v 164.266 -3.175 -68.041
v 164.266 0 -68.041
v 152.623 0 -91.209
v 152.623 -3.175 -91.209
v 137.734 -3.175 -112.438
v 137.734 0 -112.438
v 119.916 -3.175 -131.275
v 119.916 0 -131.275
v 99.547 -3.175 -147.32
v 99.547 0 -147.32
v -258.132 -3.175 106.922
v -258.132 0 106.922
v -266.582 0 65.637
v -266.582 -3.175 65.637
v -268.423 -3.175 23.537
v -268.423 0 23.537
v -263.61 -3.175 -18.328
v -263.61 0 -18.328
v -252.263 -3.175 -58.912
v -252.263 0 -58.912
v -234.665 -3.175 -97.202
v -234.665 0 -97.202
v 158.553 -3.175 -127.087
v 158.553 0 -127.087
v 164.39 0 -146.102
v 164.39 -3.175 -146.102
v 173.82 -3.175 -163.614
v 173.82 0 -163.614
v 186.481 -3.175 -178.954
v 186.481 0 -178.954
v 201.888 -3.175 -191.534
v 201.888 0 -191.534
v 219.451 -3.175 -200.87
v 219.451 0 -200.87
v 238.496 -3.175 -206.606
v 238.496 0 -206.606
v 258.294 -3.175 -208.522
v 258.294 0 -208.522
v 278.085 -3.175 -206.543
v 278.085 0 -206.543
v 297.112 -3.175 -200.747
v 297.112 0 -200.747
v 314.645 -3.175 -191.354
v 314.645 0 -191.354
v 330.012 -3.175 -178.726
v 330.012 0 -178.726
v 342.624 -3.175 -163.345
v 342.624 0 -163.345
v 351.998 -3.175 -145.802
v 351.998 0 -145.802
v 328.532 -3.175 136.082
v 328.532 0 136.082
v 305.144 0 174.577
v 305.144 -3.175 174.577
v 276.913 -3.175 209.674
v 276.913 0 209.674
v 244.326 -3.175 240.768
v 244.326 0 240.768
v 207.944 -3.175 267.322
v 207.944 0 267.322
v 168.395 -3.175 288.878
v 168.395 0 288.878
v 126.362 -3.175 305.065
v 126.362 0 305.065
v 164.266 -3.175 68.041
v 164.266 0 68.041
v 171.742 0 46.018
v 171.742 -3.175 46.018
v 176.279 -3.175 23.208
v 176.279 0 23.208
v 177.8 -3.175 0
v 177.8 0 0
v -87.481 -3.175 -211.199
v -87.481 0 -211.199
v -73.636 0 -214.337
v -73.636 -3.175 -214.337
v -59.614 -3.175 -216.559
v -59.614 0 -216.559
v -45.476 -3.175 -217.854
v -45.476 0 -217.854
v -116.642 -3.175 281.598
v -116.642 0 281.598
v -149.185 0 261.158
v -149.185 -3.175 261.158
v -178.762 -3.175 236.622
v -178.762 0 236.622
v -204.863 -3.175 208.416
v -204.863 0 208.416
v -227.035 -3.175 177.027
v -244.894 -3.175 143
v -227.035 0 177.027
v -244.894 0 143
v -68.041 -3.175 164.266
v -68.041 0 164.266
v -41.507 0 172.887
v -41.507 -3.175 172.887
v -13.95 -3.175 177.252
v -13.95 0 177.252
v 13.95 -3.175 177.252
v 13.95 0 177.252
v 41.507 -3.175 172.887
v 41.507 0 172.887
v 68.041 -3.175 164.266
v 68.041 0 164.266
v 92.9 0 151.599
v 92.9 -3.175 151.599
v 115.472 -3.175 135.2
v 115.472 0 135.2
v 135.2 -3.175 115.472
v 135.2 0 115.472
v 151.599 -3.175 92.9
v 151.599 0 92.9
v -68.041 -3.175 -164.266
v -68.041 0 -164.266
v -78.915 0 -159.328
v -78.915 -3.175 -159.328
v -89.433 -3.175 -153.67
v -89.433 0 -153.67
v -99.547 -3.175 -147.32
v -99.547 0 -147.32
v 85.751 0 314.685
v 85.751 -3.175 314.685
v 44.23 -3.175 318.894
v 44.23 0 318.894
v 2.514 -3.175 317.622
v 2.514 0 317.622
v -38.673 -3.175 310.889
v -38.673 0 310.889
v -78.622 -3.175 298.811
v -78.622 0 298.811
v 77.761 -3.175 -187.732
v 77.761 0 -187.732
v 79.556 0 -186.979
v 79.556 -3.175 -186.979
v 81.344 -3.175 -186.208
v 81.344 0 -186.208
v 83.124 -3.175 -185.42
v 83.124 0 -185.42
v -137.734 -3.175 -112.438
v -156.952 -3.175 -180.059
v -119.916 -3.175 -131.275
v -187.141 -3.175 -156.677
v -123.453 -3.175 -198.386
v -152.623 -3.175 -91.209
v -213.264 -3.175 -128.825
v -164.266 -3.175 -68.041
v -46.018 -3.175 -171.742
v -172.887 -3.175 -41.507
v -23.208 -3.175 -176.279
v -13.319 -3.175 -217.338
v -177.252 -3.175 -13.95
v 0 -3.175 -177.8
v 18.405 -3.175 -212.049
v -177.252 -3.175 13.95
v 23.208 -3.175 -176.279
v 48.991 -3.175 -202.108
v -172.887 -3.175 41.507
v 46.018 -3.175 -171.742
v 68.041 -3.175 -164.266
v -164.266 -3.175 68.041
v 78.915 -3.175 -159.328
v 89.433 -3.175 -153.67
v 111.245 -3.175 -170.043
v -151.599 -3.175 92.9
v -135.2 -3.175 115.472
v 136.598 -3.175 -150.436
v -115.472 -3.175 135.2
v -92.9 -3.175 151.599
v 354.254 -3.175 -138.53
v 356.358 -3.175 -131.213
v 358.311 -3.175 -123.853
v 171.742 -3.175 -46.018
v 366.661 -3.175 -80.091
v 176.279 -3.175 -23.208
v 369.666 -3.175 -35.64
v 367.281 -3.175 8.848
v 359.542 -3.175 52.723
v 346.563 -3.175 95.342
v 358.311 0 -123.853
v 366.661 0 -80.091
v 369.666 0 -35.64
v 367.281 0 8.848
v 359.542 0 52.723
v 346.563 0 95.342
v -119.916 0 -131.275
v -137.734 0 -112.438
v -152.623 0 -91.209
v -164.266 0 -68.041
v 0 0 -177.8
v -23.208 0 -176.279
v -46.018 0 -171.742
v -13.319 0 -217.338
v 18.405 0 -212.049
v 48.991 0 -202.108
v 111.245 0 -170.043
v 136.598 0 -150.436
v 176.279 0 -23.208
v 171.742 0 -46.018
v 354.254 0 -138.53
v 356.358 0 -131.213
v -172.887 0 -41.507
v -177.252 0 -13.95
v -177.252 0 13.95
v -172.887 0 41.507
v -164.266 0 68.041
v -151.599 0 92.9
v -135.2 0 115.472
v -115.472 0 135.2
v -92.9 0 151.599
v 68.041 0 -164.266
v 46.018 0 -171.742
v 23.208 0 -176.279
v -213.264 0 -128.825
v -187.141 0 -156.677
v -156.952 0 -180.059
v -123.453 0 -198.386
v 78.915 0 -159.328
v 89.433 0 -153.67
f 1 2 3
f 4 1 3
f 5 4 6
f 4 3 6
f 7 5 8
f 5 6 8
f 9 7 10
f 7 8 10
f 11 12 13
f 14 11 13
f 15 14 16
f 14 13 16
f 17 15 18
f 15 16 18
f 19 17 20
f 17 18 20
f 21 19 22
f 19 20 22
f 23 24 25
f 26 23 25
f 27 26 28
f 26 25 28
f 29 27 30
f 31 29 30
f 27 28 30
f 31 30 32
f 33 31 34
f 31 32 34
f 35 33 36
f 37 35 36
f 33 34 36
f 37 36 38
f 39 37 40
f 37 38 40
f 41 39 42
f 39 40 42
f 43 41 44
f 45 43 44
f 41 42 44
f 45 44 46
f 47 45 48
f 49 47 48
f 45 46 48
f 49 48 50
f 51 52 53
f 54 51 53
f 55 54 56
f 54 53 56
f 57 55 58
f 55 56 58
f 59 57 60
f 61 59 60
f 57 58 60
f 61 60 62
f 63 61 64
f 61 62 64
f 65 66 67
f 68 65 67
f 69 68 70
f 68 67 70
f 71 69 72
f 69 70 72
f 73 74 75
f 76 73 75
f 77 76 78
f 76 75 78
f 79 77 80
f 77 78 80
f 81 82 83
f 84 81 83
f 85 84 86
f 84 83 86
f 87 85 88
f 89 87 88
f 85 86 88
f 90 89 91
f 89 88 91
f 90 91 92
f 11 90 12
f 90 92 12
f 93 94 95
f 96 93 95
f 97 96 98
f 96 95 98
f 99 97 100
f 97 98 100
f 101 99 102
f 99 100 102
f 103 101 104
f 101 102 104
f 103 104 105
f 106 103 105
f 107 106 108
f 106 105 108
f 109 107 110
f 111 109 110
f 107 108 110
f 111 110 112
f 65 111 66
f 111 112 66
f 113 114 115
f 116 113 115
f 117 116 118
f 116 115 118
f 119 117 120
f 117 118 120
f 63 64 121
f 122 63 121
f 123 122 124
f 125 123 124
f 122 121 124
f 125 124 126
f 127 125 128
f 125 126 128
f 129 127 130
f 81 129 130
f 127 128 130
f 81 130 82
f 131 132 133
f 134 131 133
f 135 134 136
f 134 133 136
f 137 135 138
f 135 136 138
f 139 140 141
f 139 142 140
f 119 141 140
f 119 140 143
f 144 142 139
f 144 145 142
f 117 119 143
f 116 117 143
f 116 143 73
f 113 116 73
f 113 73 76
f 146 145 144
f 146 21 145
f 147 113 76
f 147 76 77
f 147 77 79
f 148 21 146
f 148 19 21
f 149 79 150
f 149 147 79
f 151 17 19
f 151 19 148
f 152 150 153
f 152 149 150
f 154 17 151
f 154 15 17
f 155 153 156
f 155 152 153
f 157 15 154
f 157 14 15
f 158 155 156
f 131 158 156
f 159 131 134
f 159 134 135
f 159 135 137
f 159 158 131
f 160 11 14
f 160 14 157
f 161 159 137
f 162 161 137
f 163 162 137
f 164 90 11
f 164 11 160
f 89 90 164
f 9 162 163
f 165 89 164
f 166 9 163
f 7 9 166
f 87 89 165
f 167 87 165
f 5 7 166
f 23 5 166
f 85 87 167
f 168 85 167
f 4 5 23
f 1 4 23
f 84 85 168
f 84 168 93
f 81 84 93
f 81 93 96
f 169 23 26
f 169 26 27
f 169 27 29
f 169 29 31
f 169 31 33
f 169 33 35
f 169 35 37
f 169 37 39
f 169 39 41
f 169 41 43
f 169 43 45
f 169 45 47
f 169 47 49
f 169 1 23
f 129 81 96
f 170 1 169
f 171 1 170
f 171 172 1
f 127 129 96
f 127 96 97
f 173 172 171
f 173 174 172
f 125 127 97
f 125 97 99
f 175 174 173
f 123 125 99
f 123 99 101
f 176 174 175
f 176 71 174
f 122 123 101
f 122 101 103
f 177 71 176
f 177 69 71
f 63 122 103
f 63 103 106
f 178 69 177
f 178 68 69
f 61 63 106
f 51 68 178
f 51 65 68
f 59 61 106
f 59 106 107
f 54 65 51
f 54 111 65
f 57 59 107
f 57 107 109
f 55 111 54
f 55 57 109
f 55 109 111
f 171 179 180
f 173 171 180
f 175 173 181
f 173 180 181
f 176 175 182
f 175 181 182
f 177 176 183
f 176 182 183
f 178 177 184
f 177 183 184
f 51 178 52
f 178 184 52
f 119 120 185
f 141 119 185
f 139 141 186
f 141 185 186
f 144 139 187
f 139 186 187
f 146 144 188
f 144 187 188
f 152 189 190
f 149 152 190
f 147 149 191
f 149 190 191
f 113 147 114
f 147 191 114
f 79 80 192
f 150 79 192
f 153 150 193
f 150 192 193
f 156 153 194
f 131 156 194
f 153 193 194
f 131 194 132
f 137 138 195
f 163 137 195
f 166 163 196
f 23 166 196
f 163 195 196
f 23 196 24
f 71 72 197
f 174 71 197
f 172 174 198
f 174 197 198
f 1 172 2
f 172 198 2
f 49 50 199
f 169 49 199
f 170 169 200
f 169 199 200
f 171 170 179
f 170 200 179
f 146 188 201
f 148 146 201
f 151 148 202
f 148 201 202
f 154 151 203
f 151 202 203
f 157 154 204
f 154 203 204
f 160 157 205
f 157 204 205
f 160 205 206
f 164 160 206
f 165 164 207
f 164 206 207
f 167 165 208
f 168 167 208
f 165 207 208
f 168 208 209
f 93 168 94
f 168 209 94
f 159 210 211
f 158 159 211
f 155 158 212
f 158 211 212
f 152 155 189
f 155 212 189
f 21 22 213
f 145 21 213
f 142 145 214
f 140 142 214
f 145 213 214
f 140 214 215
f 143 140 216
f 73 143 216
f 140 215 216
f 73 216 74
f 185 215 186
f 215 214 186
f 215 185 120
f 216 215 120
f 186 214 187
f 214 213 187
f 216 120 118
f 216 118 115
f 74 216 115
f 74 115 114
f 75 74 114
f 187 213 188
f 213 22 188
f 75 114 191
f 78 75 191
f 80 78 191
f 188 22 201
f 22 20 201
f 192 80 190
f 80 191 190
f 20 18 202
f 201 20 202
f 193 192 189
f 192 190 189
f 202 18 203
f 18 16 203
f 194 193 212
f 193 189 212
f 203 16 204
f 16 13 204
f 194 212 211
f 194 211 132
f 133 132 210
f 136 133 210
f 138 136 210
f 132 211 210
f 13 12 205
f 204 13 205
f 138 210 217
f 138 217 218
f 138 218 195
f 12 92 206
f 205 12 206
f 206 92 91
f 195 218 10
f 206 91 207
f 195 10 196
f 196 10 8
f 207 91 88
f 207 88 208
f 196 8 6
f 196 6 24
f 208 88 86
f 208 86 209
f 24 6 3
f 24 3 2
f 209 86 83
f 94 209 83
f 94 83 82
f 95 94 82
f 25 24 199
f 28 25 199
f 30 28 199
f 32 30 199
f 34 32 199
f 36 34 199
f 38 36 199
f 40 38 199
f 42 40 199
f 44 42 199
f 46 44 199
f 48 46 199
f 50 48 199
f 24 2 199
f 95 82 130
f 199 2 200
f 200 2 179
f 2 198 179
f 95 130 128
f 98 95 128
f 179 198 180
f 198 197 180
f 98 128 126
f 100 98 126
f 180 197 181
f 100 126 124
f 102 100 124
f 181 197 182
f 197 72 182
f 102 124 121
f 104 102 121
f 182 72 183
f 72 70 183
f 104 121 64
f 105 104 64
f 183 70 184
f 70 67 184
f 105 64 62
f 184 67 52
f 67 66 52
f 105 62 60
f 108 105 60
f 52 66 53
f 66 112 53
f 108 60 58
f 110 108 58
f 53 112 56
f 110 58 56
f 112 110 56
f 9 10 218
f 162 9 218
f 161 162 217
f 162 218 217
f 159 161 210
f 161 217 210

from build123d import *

# Parameters (mm, degrees)
F1_DEPTH = 3.175


with BuildPart() as f1:
    # F0 (on Front) → F1 (new body)
    with BuildSketch(Plane.XZ):
        with BuildLine():
            ThreePointArc((164.2657808805, 68.0411142745), (174.3836228557, 34.6870592545), (177.8, 0))
            ThreePointArc((177.8, 0), (174.3836228557, -34.6870592545), (164.2657808805, -68.0411142745))
            ThreePointArc((164.2657808805, -68.0411142745), (277.9531181005, -7.2739665138), (359.7319413837, -106.9217510028))
            ThreePointArc((359.7319413837, -106.9217510028), (359.3761364248, -115.4172186461), (358.3112136183, -123.8531837399))
            ThreePointArc((358.3112136183, -123.8531837399), (367.281161492, 8.8480312827), (328.531561761, 136.082228549))
            Line((328.531561761, 136.082228549), (164.2657808805, 68.0411142745))
        make_face()
        with BuildLine():
            ThreePointArc((68.0411142745, 164.2657808805), (125.723585695, 125.723585695), (164.2657808805, 68.0411142745))
            Line((164.2657808805, 68.0411142745), (328.531561761, 136.082228549))
            ThreePointArc((328.531561761, 136.082228549), (244.3258111618, 240.7675034736), (126.362069367, 305.0650216352))
            Line((126.362069367, 305.0650216352), (68.0411142745, 164.2657808805))
        make_face()
        with BuildLine():
            ThreePointArc((158.5532229762, -127.0870390081), (157.0041232469, -97.1378663495), (164.2657808805, -68.0411142745))
            ThreePointArc((164.2657808805, -68.0411142745), (137.7338592366, -112.4376450296), (99.5472631467, -147.32))
            ThreePointArc((99.5472631467, -147.32), (93.3013149914, -167.2172179653), (83.1243863135, -185.42))
            ThreePointArc((83.1243863135, -185.42), (124.3088906415, -160.740597571), (158.5532229762, -127.0870390081))
        make_face()
        with BuildLine():
            ThreePointArc((359.7319413837, -106.9217510028), (277.9531181005, -7.2739665138), (164.2657808805, -68.0411142745))
            Line((164.2657808805, -68.0411142745), (258.1319413837, -106.9217510028))
            Line((258.1319413837, -106.9217510028), (351.9981018868, -145.8023877311))
            ThreePointArc((351.9981018868, -145.8023877311), (355.3248382646, -134.8767336877), (358.3112136183, -123.8531837399))
            ThreePointArc((358.3112136183, -123.8531837399), (359.3761364248, -115.4172186461), (359.7319413837, -106.9217510028))
        make_face()
        with BuildLine():
            Line((258.1319413837, -106.9217510028), (164.2657808805, -68.0411142745))
            ThreePointArc((164.2657808805, -68.0411142745), (157.0041232469, -97.1378663495), (158.5532229762, -127.0870390081))
            ThreePointArc((158.5532229762, -127.0870390081), (248.3480567304, -208.0495691395), (351.9981018868, -145.8023877311))
            Line((351.9981018868, -145.8023877311), (258.1319413837, -106.9217510028))
        make_face()
        with BuildLine():
            ThreePointArc((-68.0411142745, 164.2657808805), (0, 177.8), (68.0411142745, 164.2657808805))
            Line((68.0411142745, 164.2657808805), (126.362069367, 305.0650216352))
            ThreePointArc((126.362069367, 305.0650216352), (2.514428483, 317.6217641107), (-116.6419101849, 281.5984815094))
            Line((-116.6419101849, 281.5984815094), (-68.0411142745, 164.2657808805))
        make_face()
        with BuildLine():
            ThreePointArc((83.1243863135, -185.42), (93.3013149914, -167.2172179653), (99.5472631467, -147.32))
            ThreePointArc((99.5472631467, -147.32), (84.2214695555, -156.5873049322), (68.0411142745, -164.2657808805))
            Line((68.0411142745, -164.2657808805), (77.7612734566, -187.7323210063))
            ThreePointArc((77.7612734566, -187.7323210063), (80.4511378852, -186.5954297752), (83.1243863135, -185.42))
        make_face()
        with BuildLine():
            ThreePointArc((-164.2657808805, 68.0411142745), (-125.723585695, 125.723585695), (-68.0411142745, 164.2657808805))
            Line((-68.0411142745, 164.2657808805), (-116.6419101849, 281.5984815094))
            ThreePointArc((-116.6419101849, 281.5984815094), (-204.8629851326, 208.4159123673), (-258.1319413837, 106.9217510028))
            Line((-258.1319413837, 106.9217510028), (-164.2657808805, 68.0411142745))
        make_face()
        with BuildLine():
            ThreePointArc((-164.2657808805, -68.0411142745), (-177.8, 0), (-164.2657808805, 68.0411142745))
            Line((-164.2657808805, 68.0411142745), (-258.1319413837, 106.9217510028))
            ThreePointArc((-258.1319413837, 106.9217510028), (-266.8448532831, 2.5095343628), (-234.6654012579, -97.2015918207))
            Line((-234.6654012579, -97.2015918207), (-164.2657808805, -68.0411142745))
        make_face()
        with BuildLine():
            ThreePointArc((-99.5472631467, -147.32), (-137.7338592366, -112.4376450296), (-164.2657808805, -68.0411142745))
            Line((-164.2657808805, -68.0411142745), (-234.6654012579, -97.2015918207))
            ThreePointArc((-234.6654012579, -97.2015918207), (-172.5099209033, -168.9661068295), (-87.4814326387, -211.1988611321))
            Line((-87.4814326387, -211.1988611321), (-79.0449703485, -190.8314394527))
            ThreePointArc((-79.0449703485, -190.8314394527), (-91.908148752, -170.3064913493), (-99.5472631467, -147.32))
        make_face()
        with BuildLine():
            Line((77.7612734566, -187.7323210063), (68.0411142745, -164.2657808805))
            ThreePointArc((68.0411142745, -164.2657808805), (34.6870592545, -174.3836228557), (0, -177.8))
            ThreePointArc((0, -177.8), (-34.6870592545, -174.3836228557), (-68.0411142745, -164.2657808805))
            Line((-68.0411142745, -164.2657808805), (-79.0449703485, -190.8314394527))
            ThreePointArc((-79.0449703485, -190.8314394527), (-63.7096435601, -206.143169746), (-45.4758683551, -217.8543086339))
            ThreePointArc((-45.4758683551, -217.8543086339), (18.4051257388, -212.0494957439), (77.7612734566, -187.7323210063))
        make_face()
        with BuildLine():
            ThreePointArc((-68.0411142745, -164.2657808805), (-84.2214695555, -156.5873049322), (-99.5472631467, -147.32))
            ThreePointArc((-99.5472631467, -147.32), (-91.908148752, -170.3064913493), (-79.0449703485, -190.8314394527))
            Line((-79.0449703485, -190.8314394527), (-68.0411142745, -164.2657808805))
        make_face()
        with BuildLine():
            ThreePointArc((-87.4814326387, -211.1988611321), (-66.6429296743, -215.563425688), (-45.4758683551, -217.8543086339))
            ThreePointArc((-45.4758683551, -217.8543086339), (-63.7096435601, -206.143169746), (-79.0449703485, -190.8314394527))
            Line((-79.0449703485, -190.8314394527), (-87.4814326387, -211.1988611321))
        make_face()
    extrude(amount=F1_DEPTH)


solid = f1.part
